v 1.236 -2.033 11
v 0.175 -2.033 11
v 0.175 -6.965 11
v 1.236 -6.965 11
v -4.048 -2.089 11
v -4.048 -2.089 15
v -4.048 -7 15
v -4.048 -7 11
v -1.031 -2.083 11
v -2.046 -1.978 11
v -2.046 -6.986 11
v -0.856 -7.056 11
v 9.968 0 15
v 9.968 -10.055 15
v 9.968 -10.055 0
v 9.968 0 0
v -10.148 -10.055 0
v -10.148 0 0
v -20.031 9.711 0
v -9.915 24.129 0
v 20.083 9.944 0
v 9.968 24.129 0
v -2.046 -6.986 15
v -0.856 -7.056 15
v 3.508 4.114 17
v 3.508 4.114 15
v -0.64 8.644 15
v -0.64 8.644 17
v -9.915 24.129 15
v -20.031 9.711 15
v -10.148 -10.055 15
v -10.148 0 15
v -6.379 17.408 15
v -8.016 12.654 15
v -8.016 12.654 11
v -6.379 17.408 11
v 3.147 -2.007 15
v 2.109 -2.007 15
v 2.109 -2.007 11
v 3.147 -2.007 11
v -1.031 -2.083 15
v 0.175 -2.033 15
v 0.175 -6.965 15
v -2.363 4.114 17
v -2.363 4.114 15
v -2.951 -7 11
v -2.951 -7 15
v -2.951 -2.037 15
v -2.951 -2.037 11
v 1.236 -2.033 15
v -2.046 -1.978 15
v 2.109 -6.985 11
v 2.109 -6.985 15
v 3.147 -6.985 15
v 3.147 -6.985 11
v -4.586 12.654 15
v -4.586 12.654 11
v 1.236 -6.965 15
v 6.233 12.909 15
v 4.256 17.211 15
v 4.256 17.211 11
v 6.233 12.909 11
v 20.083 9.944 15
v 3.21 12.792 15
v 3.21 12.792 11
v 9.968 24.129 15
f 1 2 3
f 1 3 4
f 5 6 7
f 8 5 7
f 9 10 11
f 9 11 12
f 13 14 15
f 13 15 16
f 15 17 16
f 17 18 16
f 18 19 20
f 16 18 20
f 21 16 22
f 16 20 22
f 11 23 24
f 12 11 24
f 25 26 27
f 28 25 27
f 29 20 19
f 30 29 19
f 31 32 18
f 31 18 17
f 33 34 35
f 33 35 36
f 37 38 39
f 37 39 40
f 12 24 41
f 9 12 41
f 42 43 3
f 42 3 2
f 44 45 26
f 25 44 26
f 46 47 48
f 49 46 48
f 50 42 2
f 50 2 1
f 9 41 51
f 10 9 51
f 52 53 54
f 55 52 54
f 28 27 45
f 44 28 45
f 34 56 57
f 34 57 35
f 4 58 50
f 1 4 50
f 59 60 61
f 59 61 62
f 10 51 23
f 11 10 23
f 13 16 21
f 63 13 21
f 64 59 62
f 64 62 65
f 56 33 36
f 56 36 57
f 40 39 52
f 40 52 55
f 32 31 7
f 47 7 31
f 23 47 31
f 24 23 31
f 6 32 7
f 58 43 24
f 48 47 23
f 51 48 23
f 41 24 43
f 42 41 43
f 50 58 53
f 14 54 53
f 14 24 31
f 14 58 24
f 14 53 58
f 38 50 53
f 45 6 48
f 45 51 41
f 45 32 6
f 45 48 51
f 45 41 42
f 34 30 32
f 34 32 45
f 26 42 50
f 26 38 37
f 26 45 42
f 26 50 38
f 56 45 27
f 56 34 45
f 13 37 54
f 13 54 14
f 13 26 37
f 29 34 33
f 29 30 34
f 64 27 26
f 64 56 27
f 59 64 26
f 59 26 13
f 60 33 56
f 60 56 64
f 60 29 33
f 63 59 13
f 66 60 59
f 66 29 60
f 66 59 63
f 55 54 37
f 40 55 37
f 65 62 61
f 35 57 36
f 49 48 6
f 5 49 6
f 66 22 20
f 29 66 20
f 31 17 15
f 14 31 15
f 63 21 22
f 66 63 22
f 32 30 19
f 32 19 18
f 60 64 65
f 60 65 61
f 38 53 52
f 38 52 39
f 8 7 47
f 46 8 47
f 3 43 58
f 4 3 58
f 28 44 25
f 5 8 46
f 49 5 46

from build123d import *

# Parameters (mm, degrees)
PAD_DEPTH       = 15
POCKET_DEPTH    = 4
POCKET001_DEPTH = 4
PAD001_DEPTH    = 2
POCKET002_DEPTH = 4
POCKET003_DEPTH = 4
SKETCH006_W     = 1.060891
SKETCH006_H     = 4.93171
POCKET004_DEPTH = 4
SKETCH007_W     = 1.038232
SKETCH007_H     = 4.977957
POCKET005_DEPTH = 4


with BuildPart() as part:
    # Sketch → Pad (new body)
    with BuildSketch(Plane.XY):
        Polygon((-10.147716, -10.055362), (9.967627, -10.055362), (9.967627, 0), (20.083433, 9.943707), (9.967627, 24.129093), (-9.915169, 24.129093), (-20.030979, 9.711162), (-10.147716, 0), align=None)
    extrude(amount=PAD_DEPTH)

    # Sketch001 (on Face10 of Pad) → Pocket (cut)
    with BuildSketch(Plane.XY.offset(15)):
        Polygon((-8.015594, 12.653538), (-6.378841, 17.407913), (-4.586209, 12.653538), align=None)
    extrude(amount=-POCKET_DEPTH, mode=Mode.SUBTRACT)

    # Sketch002 (on Face5 of Pocket) → Pocket001 (cut)
    with BuildSketch(Plane.XY.offset(15)):
        Polygon((3.209776, 12.792396), (4.256241, 17.210794), (6.232895, 12.908666), align=None)
    extrude(amount=-POCKET001_DEPTH, mode=Mode.SUBTRACT)

    # Sketch003 (on Face5 of Pocket001) → Pad001 (join)
    with BuildSketch(Plane.XY.offset(15)):
        Polygon((-0.640232, 8.644424), (-2.363165, 4.113749), (3.507571, 4.113749), align=None)
    extrude(amount=PAD001_DEPTH)

    # Sketch004 (on Face5 of Pad001) → Pocket002 (cut)
    with BuildSketch(Plane.XY.offset(15)):
        Polygon((-4.047933, -2.089132), (-4.047933, -7.000175), (-2.950786, -7.000175), (-2.950786, -2.036887), align=None)
    extrude(amount=-POCKET002_DEPTH, mode=Mode.SUBTRACT)

    # Sketch005 (on Face5 of Pocket002) → Pocket003 (cut)
    with BuildSketch(Plane.XY.offset(15)):
        Polygon((-2.046365, -1.977987), (-2.046365, -6.985984), (-0.855654, -7.056026), (-1.030757, -2.08305), align=None)
    extrude(amount=-POCKET003_DEPTH, mode=Mode.SUBTRACT)

    # Sketch006 (on Face5 of Pocket003) → Pocket004 (cut)
    with BuildSketch(Plane.XY.offset(15)):
        with Locations((0.70562, -4.49912)):
            Rectangle(SKETCH006_W, SKETCH006_H)
    extrude(amount=-POCKET004_DEPTH, mode=Mode.SUBTRACT)

    # Sketch007 (on Face5 of Pocket004) → Pocket005 (cut)
    with BuildSketch(Plane.XY.offset(15)):
        with Locations((2.627853, -4.495738)):
            Rectangle(SKETCH007_W, SKETCH007_H)
    extrude(amount=-POCKET005_DEPTH, mode=Mode.SUBTRACT)


solid = part.part
